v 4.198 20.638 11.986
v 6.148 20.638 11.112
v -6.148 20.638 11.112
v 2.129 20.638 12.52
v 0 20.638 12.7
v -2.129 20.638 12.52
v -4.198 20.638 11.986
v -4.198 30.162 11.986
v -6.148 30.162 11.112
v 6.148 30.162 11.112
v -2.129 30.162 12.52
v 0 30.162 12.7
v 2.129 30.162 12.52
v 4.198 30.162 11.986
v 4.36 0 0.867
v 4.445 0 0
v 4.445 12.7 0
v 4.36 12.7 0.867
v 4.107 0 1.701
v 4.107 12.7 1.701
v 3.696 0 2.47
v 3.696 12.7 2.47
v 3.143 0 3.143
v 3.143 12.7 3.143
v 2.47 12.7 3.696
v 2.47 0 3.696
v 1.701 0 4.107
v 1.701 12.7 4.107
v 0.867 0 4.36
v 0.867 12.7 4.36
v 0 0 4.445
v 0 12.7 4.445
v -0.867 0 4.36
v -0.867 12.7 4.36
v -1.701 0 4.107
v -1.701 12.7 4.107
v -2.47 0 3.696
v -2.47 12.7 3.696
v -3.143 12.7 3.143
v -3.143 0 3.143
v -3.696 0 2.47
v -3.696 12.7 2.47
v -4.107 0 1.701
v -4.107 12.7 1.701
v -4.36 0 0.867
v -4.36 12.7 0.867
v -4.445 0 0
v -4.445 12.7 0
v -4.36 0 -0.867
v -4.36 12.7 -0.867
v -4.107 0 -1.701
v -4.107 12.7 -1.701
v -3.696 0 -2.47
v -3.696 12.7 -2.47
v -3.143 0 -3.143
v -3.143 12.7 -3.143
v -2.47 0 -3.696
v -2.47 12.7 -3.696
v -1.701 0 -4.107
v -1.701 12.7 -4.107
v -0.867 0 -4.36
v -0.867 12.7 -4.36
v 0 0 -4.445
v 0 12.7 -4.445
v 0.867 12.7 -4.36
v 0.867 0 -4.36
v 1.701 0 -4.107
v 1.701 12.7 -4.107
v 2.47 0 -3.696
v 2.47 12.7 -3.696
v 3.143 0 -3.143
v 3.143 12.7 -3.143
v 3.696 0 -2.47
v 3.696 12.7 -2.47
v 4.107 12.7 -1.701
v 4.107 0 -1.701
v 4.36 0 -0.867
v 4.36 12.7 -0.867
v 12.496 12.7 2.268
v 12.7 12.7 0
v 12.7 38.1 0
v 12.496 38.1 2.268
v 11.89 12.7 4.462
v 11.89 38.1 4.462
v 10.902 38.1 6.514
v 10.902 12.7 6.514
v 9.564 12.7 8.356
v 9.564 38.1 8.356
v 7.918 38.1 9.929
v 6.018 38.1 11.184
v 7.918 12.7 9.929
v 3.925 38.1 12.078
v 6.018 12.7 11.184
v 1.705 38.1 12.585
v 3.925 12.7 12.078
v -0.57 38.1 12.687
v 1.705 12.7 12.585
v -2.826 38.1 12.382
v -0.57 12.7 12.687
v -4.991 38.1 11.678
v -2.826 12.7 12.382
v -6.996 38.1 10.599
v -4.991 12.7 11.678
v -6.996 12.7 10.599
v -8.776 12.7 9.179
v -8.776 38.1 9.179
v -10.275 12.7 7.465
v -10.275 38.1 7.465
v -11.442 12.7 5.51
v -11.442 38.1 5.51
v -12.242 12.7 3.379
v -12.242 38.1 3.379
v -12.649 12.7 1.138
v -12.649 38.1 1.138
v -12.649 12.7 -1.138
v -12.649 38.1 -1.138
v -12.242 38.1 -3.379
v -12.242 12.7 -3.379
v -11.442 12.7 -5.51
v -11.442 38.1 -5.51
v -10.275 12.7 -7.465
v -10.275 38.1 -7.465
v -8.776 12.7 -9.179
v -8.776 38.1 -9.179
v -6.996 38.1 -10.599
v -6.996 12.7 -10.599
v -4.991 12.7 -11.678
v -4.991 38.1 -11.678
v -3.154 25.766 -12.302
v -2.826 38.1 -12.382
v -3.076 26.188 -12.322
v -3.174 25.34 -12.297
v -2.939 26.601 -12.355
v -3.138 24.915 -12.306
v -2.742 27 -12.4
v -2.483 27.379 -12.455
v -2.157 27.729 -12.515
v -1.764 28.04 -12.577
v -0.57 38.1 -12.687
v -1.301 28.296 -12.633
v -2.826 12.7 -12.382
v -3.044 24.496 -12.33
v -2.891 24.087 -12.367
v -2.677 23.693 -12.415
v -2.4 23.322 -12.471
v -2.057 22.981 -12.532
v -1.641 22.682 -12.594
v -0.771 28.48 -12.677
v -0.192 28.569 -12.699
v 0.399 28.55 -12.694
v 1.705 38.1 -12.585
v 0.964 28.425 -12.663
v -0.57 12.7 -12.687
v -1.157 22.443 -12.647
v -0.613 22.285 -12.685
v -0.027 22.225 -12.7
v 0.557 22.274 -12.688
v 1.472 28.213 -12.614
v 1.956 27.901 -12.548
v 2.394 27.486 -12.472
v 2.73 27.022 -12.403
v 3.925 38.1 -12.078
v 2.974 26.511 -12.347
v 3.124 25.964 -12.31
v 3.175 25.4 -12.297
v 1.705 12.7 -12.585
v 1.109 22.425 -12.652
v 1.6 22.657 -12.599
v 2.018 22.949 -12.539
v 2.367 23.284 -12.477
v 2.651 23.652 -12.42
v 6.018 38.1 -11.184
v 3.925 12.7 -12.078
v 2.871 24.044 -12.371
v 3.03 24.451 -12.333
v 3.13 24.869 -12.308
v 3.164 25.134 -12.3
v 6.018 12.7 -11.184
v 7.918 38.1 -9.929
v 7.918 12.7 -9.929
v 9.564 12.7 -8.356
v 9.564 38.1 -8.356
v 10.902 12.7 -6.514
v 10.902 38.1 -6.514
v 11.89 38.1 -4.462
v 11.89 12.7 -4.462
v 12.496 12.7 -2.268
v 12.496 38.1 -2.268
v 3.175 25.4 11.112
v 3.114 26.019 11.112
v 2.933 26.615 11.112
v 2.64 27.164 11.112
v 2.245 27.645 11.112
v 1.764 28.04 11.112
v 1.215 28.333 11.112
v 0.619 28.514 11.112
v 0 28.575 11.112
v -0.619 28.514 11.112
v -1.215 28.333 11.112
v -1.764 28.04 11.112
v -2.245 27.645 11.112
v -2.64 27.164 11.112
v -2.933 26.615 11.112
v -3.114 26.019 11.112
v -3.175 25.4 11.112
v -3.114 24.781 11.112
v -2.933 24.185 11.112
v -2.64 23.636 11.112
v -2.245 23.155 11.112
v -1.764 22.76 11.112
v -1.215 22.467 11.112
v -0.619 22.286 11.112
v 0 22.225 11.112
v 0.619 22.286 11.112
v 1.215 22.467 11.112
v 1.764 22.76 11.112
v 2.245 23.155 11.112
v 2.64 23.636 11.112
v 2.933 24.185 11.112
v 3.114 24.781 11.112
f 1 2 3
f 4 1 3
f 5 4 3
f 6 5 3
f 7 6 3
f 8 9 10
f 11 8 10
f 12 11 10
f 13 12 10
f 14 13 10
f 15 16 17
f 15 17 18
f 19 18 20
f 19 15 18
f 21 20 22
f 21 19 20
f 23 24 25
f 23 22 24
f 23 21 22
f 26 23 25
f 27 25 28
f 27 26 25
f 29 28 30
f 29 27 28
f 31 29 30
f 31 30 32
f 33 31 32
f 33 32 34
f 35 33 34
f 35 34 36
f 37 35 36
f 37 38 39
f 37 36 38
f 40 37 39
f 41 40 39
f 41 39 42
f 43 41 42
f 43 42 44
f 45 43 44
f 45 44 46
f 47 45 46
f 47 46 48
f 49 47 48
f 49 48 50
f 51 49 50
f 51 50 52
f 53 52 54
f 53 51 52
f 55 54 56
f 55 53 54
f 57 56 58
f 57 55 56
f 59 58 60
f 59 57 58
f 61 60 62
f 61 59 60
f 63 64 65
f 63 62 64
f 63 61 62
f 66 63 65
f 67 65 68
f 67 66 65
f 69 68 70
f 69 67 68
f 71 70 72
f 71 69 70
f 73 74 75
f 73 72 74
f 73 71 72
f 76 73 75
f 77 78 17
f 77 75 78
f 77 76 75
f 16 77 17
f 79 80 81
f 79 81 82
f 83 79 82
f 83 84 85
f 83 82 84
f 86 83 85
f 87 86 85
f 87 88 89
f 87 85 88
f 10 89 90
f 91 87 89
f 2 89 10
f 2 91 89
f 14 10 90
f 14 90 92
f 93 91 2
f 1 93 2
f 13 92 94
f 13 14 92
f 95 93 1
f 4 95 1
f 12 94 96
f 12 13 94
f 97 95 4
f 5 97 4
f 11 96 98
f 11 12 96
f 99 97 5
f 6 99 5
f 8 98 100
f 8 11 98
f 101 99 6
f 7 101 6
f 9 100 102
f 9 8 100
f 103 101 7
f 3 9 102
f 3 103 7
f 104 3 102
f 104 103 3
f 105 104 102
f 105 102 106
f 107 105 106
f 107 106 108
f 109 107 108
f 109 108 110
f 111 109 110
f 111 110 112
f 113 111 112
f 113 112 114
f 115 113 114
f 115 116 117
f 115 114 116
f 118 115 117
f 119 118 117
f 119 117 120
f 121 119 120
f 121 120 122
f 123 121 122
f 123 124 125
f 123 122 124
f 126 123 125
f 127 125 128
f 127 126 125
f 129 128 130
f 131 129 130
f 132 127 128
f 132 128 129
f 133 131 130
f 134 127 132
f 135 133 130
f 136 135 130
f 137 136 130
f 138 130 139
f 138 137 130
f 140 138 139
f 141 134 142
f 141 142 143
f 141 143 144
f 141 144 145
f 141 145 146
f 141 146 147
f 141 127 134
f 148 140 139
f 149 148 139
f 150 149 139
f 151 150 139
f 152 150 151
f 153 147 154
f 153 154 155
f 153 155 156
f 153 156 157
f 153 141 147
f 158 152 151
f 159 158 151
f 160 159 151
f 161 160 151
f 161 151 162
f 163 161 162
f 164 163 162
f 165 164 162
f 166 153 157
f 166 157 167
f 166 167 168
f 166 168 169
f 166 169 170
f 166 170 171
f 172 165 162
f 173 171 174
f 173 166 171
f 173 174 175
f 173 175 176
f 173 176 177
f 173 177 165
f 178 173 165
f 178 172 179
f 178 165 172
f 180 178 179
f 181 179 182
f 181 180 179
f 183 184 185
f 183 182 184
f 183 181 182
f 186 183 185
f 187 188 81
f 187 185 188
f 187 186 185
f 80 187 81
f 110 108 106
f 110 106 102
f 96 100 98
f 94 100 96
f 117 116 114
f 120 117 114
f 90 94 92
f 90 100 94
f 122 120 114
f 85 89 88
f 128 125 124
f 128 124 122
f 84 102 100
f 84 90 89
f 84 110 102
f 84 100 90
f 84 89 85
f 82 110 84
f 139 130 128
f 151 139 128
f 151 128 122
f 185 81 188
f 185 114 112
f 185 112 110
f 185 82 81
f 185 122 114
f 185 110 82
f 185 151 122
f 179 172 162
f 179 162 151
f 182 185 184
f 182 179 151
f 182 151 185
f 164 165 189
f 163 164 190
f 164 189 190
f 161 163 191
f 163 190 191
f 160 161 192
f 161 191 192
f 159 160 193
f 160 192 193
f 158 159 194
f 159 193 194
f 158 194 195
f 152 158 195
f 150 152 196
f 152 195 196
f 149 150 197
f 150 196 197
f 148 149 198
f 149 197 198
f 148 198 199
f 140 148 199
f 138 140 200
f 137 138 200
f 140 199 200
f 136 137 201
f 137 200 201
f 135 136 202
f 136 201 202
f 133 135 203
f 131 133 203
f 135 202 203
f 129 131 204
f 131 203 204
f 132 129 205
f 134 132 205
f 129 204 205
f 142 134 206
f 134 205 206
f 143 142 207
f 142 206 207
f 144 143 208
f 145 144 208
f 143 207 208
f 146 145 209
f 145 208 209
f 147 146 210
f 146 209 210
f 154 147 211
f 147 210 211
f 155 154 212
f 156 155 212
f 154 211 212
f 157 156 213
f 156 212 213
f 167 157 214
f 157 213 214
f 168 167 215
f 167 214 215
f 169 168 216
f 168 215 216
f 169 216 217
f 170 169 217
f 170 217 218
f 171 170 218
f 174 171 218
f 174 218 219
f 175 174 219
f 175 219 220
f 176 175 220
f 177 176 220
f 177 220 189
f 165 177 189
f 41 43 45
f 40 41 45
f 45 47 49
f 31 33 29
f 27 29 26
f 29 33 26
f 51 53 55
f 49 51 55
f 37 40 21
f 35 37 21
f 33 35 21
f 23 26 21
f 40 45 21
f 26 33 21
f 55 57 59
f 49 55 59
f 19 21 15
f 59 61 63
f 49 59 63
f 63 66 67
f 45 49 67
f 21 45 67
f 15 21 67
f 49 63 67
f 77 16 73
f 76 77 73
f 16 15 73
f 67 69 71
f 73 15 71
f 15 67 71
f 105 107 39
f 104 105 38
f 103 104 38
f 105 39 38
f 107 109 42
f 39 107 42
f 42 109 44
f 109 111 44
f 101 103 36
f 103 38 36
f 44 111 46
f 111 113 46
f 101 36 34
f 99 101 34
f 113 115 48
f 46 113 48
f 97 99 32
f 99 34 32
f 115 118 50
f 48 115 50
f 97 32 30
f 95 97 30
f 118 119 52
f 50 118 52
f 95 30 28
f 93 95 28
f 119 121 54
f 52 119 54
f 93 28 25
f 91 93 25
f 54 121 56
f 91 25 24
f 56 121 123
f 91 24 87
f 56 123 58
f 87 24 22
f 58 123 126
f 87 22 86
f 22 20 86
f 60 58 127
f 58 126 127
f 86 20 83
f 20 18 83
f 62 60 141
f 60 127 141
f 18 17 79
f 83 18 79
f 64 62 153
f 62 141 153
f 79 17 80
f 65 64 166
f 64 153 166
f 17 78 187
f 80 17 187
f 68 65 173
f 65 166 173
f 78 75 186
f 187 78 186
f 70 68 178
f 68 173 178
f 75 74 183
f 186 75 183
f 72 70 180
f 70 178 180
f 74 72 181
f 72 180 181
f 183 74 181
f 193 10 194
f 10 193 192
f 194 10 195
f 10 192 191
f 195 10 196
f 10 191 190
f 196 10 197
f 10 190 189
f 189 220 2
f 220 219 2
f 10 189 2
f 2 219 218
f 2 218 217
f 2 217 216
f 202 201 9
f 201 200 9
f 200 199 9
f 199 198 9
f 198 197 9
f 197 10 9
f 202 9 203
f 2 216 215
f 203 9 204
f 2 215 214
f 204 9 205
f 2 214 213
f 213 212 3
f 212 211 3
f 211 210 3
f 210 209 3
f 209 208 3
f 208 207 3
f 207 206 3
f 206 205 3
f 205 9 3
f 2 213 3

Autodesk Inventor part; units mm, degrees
ref_plane "YZ Plane" through (0, 0, 0) normal (1, 0, 0) x (0, 1, 0)
ref_plane "XZ Plane" through (0, 0, 0) normal (0, 1, 0) x (-1, 0, 0)
ref_plane "XY Plane" through (0, 0, 0) normal (0, 0, 1) x (1, 0, 0)
sketch "Sketch1" plane through (0, 0, 0) normal (0, 0, 1) x (1, 0, 0)
  line L0 (0, 0) -> (0, 38.1)
  line L1 (0, 38.1) -> (12.7, 38.1)
  line L2 (12.7, 38.1) -> (12.7, 12.7)
  line L3 (12.7, 12.7) -> (4.445, 12.7)
  line L4 (4.445, 12.7) -> (4.445, 0)
  line L5 (4.445, 0) -> (0, 0)
  dimension "d0" = 38.1
  dimension "d1" = 12.7
  dimension "d2" = 25.4
  dimension "d3" = 8.255
revolve "Revolution1" add sketch "Sketch1" angle 360 about axis through (0, 0, 0) along (0, 1, 0)
sketch "Sketch2" plane through (0, 0, 0) normal (0, 0, 1) x (1, 0, 0)
  line L0 (-12.7, 38.1) -> (12.7, 38.1) projected
  line L1 (12.7, 38.1) -> (12.7, 12.7) projected
  line L2 (12.7, 12.7) -> (4.445, 12.7) projected
  line L3 (4.445, 12.7) -> (4.445, 0) projected
  line L4 (4.445, 0) -> (-4.445, 0) projected
  line L5 (-4.445, 0) -> (-4.445, 12.7) projected
  line L6 (-4.445, 12.7) -> (-12.7, 12.7) projected
  line L7 (-12.7, 12.7) -> (-12.7, 38.1) projected
  circle A0 centre (0, 25.4) radius 3.175
  point P0 (0, 0)
  dimension "d5" = 6.35
extrude "Extrusion1" cut sketch "Sketch2" along normal through all both and the other way through all contours A0
sketch "Sketch3" plane through (0, 0, 0) normal (1, 0, 0) x (0, 1, 0)
  line L0 (28.575, 12.7) -> (30.1625, 12.7)
  line L1 (30.1625, 12.7) -> (30.1625, 11.1125)
  line L2 (30.1625, 11.1125) -> (20.6375, 11.1125)
  line L3 (20.6375, 11.1125) -> (20.6375, 12.7)
  line L4 (20.6375, 12.7) -> (30.1625, 12.7)
  point P0 (0, 0)
  point P1 (38.1, 12.7)
  dimension "d9" = 1.5875
  dimension "d10" = 1.5875
  dimension "d11" = 9.525
extrude "Extrusion2" cut sketch "Sketch3" along normal through all both and the other way through all
sketch "Sketch4" plane through (0, 0, 0) normal (1, 0, 0) x (0, 1, 0)
  line L0 (38.1, -12.7) -> (12.7, -12.7) projected
  line L1 (38.1, -12.7) -> (28.575, -12.7)
  point P0 (0, 0)
  dimension "d14" = 9.525
properties part number "right angle rod holder"
